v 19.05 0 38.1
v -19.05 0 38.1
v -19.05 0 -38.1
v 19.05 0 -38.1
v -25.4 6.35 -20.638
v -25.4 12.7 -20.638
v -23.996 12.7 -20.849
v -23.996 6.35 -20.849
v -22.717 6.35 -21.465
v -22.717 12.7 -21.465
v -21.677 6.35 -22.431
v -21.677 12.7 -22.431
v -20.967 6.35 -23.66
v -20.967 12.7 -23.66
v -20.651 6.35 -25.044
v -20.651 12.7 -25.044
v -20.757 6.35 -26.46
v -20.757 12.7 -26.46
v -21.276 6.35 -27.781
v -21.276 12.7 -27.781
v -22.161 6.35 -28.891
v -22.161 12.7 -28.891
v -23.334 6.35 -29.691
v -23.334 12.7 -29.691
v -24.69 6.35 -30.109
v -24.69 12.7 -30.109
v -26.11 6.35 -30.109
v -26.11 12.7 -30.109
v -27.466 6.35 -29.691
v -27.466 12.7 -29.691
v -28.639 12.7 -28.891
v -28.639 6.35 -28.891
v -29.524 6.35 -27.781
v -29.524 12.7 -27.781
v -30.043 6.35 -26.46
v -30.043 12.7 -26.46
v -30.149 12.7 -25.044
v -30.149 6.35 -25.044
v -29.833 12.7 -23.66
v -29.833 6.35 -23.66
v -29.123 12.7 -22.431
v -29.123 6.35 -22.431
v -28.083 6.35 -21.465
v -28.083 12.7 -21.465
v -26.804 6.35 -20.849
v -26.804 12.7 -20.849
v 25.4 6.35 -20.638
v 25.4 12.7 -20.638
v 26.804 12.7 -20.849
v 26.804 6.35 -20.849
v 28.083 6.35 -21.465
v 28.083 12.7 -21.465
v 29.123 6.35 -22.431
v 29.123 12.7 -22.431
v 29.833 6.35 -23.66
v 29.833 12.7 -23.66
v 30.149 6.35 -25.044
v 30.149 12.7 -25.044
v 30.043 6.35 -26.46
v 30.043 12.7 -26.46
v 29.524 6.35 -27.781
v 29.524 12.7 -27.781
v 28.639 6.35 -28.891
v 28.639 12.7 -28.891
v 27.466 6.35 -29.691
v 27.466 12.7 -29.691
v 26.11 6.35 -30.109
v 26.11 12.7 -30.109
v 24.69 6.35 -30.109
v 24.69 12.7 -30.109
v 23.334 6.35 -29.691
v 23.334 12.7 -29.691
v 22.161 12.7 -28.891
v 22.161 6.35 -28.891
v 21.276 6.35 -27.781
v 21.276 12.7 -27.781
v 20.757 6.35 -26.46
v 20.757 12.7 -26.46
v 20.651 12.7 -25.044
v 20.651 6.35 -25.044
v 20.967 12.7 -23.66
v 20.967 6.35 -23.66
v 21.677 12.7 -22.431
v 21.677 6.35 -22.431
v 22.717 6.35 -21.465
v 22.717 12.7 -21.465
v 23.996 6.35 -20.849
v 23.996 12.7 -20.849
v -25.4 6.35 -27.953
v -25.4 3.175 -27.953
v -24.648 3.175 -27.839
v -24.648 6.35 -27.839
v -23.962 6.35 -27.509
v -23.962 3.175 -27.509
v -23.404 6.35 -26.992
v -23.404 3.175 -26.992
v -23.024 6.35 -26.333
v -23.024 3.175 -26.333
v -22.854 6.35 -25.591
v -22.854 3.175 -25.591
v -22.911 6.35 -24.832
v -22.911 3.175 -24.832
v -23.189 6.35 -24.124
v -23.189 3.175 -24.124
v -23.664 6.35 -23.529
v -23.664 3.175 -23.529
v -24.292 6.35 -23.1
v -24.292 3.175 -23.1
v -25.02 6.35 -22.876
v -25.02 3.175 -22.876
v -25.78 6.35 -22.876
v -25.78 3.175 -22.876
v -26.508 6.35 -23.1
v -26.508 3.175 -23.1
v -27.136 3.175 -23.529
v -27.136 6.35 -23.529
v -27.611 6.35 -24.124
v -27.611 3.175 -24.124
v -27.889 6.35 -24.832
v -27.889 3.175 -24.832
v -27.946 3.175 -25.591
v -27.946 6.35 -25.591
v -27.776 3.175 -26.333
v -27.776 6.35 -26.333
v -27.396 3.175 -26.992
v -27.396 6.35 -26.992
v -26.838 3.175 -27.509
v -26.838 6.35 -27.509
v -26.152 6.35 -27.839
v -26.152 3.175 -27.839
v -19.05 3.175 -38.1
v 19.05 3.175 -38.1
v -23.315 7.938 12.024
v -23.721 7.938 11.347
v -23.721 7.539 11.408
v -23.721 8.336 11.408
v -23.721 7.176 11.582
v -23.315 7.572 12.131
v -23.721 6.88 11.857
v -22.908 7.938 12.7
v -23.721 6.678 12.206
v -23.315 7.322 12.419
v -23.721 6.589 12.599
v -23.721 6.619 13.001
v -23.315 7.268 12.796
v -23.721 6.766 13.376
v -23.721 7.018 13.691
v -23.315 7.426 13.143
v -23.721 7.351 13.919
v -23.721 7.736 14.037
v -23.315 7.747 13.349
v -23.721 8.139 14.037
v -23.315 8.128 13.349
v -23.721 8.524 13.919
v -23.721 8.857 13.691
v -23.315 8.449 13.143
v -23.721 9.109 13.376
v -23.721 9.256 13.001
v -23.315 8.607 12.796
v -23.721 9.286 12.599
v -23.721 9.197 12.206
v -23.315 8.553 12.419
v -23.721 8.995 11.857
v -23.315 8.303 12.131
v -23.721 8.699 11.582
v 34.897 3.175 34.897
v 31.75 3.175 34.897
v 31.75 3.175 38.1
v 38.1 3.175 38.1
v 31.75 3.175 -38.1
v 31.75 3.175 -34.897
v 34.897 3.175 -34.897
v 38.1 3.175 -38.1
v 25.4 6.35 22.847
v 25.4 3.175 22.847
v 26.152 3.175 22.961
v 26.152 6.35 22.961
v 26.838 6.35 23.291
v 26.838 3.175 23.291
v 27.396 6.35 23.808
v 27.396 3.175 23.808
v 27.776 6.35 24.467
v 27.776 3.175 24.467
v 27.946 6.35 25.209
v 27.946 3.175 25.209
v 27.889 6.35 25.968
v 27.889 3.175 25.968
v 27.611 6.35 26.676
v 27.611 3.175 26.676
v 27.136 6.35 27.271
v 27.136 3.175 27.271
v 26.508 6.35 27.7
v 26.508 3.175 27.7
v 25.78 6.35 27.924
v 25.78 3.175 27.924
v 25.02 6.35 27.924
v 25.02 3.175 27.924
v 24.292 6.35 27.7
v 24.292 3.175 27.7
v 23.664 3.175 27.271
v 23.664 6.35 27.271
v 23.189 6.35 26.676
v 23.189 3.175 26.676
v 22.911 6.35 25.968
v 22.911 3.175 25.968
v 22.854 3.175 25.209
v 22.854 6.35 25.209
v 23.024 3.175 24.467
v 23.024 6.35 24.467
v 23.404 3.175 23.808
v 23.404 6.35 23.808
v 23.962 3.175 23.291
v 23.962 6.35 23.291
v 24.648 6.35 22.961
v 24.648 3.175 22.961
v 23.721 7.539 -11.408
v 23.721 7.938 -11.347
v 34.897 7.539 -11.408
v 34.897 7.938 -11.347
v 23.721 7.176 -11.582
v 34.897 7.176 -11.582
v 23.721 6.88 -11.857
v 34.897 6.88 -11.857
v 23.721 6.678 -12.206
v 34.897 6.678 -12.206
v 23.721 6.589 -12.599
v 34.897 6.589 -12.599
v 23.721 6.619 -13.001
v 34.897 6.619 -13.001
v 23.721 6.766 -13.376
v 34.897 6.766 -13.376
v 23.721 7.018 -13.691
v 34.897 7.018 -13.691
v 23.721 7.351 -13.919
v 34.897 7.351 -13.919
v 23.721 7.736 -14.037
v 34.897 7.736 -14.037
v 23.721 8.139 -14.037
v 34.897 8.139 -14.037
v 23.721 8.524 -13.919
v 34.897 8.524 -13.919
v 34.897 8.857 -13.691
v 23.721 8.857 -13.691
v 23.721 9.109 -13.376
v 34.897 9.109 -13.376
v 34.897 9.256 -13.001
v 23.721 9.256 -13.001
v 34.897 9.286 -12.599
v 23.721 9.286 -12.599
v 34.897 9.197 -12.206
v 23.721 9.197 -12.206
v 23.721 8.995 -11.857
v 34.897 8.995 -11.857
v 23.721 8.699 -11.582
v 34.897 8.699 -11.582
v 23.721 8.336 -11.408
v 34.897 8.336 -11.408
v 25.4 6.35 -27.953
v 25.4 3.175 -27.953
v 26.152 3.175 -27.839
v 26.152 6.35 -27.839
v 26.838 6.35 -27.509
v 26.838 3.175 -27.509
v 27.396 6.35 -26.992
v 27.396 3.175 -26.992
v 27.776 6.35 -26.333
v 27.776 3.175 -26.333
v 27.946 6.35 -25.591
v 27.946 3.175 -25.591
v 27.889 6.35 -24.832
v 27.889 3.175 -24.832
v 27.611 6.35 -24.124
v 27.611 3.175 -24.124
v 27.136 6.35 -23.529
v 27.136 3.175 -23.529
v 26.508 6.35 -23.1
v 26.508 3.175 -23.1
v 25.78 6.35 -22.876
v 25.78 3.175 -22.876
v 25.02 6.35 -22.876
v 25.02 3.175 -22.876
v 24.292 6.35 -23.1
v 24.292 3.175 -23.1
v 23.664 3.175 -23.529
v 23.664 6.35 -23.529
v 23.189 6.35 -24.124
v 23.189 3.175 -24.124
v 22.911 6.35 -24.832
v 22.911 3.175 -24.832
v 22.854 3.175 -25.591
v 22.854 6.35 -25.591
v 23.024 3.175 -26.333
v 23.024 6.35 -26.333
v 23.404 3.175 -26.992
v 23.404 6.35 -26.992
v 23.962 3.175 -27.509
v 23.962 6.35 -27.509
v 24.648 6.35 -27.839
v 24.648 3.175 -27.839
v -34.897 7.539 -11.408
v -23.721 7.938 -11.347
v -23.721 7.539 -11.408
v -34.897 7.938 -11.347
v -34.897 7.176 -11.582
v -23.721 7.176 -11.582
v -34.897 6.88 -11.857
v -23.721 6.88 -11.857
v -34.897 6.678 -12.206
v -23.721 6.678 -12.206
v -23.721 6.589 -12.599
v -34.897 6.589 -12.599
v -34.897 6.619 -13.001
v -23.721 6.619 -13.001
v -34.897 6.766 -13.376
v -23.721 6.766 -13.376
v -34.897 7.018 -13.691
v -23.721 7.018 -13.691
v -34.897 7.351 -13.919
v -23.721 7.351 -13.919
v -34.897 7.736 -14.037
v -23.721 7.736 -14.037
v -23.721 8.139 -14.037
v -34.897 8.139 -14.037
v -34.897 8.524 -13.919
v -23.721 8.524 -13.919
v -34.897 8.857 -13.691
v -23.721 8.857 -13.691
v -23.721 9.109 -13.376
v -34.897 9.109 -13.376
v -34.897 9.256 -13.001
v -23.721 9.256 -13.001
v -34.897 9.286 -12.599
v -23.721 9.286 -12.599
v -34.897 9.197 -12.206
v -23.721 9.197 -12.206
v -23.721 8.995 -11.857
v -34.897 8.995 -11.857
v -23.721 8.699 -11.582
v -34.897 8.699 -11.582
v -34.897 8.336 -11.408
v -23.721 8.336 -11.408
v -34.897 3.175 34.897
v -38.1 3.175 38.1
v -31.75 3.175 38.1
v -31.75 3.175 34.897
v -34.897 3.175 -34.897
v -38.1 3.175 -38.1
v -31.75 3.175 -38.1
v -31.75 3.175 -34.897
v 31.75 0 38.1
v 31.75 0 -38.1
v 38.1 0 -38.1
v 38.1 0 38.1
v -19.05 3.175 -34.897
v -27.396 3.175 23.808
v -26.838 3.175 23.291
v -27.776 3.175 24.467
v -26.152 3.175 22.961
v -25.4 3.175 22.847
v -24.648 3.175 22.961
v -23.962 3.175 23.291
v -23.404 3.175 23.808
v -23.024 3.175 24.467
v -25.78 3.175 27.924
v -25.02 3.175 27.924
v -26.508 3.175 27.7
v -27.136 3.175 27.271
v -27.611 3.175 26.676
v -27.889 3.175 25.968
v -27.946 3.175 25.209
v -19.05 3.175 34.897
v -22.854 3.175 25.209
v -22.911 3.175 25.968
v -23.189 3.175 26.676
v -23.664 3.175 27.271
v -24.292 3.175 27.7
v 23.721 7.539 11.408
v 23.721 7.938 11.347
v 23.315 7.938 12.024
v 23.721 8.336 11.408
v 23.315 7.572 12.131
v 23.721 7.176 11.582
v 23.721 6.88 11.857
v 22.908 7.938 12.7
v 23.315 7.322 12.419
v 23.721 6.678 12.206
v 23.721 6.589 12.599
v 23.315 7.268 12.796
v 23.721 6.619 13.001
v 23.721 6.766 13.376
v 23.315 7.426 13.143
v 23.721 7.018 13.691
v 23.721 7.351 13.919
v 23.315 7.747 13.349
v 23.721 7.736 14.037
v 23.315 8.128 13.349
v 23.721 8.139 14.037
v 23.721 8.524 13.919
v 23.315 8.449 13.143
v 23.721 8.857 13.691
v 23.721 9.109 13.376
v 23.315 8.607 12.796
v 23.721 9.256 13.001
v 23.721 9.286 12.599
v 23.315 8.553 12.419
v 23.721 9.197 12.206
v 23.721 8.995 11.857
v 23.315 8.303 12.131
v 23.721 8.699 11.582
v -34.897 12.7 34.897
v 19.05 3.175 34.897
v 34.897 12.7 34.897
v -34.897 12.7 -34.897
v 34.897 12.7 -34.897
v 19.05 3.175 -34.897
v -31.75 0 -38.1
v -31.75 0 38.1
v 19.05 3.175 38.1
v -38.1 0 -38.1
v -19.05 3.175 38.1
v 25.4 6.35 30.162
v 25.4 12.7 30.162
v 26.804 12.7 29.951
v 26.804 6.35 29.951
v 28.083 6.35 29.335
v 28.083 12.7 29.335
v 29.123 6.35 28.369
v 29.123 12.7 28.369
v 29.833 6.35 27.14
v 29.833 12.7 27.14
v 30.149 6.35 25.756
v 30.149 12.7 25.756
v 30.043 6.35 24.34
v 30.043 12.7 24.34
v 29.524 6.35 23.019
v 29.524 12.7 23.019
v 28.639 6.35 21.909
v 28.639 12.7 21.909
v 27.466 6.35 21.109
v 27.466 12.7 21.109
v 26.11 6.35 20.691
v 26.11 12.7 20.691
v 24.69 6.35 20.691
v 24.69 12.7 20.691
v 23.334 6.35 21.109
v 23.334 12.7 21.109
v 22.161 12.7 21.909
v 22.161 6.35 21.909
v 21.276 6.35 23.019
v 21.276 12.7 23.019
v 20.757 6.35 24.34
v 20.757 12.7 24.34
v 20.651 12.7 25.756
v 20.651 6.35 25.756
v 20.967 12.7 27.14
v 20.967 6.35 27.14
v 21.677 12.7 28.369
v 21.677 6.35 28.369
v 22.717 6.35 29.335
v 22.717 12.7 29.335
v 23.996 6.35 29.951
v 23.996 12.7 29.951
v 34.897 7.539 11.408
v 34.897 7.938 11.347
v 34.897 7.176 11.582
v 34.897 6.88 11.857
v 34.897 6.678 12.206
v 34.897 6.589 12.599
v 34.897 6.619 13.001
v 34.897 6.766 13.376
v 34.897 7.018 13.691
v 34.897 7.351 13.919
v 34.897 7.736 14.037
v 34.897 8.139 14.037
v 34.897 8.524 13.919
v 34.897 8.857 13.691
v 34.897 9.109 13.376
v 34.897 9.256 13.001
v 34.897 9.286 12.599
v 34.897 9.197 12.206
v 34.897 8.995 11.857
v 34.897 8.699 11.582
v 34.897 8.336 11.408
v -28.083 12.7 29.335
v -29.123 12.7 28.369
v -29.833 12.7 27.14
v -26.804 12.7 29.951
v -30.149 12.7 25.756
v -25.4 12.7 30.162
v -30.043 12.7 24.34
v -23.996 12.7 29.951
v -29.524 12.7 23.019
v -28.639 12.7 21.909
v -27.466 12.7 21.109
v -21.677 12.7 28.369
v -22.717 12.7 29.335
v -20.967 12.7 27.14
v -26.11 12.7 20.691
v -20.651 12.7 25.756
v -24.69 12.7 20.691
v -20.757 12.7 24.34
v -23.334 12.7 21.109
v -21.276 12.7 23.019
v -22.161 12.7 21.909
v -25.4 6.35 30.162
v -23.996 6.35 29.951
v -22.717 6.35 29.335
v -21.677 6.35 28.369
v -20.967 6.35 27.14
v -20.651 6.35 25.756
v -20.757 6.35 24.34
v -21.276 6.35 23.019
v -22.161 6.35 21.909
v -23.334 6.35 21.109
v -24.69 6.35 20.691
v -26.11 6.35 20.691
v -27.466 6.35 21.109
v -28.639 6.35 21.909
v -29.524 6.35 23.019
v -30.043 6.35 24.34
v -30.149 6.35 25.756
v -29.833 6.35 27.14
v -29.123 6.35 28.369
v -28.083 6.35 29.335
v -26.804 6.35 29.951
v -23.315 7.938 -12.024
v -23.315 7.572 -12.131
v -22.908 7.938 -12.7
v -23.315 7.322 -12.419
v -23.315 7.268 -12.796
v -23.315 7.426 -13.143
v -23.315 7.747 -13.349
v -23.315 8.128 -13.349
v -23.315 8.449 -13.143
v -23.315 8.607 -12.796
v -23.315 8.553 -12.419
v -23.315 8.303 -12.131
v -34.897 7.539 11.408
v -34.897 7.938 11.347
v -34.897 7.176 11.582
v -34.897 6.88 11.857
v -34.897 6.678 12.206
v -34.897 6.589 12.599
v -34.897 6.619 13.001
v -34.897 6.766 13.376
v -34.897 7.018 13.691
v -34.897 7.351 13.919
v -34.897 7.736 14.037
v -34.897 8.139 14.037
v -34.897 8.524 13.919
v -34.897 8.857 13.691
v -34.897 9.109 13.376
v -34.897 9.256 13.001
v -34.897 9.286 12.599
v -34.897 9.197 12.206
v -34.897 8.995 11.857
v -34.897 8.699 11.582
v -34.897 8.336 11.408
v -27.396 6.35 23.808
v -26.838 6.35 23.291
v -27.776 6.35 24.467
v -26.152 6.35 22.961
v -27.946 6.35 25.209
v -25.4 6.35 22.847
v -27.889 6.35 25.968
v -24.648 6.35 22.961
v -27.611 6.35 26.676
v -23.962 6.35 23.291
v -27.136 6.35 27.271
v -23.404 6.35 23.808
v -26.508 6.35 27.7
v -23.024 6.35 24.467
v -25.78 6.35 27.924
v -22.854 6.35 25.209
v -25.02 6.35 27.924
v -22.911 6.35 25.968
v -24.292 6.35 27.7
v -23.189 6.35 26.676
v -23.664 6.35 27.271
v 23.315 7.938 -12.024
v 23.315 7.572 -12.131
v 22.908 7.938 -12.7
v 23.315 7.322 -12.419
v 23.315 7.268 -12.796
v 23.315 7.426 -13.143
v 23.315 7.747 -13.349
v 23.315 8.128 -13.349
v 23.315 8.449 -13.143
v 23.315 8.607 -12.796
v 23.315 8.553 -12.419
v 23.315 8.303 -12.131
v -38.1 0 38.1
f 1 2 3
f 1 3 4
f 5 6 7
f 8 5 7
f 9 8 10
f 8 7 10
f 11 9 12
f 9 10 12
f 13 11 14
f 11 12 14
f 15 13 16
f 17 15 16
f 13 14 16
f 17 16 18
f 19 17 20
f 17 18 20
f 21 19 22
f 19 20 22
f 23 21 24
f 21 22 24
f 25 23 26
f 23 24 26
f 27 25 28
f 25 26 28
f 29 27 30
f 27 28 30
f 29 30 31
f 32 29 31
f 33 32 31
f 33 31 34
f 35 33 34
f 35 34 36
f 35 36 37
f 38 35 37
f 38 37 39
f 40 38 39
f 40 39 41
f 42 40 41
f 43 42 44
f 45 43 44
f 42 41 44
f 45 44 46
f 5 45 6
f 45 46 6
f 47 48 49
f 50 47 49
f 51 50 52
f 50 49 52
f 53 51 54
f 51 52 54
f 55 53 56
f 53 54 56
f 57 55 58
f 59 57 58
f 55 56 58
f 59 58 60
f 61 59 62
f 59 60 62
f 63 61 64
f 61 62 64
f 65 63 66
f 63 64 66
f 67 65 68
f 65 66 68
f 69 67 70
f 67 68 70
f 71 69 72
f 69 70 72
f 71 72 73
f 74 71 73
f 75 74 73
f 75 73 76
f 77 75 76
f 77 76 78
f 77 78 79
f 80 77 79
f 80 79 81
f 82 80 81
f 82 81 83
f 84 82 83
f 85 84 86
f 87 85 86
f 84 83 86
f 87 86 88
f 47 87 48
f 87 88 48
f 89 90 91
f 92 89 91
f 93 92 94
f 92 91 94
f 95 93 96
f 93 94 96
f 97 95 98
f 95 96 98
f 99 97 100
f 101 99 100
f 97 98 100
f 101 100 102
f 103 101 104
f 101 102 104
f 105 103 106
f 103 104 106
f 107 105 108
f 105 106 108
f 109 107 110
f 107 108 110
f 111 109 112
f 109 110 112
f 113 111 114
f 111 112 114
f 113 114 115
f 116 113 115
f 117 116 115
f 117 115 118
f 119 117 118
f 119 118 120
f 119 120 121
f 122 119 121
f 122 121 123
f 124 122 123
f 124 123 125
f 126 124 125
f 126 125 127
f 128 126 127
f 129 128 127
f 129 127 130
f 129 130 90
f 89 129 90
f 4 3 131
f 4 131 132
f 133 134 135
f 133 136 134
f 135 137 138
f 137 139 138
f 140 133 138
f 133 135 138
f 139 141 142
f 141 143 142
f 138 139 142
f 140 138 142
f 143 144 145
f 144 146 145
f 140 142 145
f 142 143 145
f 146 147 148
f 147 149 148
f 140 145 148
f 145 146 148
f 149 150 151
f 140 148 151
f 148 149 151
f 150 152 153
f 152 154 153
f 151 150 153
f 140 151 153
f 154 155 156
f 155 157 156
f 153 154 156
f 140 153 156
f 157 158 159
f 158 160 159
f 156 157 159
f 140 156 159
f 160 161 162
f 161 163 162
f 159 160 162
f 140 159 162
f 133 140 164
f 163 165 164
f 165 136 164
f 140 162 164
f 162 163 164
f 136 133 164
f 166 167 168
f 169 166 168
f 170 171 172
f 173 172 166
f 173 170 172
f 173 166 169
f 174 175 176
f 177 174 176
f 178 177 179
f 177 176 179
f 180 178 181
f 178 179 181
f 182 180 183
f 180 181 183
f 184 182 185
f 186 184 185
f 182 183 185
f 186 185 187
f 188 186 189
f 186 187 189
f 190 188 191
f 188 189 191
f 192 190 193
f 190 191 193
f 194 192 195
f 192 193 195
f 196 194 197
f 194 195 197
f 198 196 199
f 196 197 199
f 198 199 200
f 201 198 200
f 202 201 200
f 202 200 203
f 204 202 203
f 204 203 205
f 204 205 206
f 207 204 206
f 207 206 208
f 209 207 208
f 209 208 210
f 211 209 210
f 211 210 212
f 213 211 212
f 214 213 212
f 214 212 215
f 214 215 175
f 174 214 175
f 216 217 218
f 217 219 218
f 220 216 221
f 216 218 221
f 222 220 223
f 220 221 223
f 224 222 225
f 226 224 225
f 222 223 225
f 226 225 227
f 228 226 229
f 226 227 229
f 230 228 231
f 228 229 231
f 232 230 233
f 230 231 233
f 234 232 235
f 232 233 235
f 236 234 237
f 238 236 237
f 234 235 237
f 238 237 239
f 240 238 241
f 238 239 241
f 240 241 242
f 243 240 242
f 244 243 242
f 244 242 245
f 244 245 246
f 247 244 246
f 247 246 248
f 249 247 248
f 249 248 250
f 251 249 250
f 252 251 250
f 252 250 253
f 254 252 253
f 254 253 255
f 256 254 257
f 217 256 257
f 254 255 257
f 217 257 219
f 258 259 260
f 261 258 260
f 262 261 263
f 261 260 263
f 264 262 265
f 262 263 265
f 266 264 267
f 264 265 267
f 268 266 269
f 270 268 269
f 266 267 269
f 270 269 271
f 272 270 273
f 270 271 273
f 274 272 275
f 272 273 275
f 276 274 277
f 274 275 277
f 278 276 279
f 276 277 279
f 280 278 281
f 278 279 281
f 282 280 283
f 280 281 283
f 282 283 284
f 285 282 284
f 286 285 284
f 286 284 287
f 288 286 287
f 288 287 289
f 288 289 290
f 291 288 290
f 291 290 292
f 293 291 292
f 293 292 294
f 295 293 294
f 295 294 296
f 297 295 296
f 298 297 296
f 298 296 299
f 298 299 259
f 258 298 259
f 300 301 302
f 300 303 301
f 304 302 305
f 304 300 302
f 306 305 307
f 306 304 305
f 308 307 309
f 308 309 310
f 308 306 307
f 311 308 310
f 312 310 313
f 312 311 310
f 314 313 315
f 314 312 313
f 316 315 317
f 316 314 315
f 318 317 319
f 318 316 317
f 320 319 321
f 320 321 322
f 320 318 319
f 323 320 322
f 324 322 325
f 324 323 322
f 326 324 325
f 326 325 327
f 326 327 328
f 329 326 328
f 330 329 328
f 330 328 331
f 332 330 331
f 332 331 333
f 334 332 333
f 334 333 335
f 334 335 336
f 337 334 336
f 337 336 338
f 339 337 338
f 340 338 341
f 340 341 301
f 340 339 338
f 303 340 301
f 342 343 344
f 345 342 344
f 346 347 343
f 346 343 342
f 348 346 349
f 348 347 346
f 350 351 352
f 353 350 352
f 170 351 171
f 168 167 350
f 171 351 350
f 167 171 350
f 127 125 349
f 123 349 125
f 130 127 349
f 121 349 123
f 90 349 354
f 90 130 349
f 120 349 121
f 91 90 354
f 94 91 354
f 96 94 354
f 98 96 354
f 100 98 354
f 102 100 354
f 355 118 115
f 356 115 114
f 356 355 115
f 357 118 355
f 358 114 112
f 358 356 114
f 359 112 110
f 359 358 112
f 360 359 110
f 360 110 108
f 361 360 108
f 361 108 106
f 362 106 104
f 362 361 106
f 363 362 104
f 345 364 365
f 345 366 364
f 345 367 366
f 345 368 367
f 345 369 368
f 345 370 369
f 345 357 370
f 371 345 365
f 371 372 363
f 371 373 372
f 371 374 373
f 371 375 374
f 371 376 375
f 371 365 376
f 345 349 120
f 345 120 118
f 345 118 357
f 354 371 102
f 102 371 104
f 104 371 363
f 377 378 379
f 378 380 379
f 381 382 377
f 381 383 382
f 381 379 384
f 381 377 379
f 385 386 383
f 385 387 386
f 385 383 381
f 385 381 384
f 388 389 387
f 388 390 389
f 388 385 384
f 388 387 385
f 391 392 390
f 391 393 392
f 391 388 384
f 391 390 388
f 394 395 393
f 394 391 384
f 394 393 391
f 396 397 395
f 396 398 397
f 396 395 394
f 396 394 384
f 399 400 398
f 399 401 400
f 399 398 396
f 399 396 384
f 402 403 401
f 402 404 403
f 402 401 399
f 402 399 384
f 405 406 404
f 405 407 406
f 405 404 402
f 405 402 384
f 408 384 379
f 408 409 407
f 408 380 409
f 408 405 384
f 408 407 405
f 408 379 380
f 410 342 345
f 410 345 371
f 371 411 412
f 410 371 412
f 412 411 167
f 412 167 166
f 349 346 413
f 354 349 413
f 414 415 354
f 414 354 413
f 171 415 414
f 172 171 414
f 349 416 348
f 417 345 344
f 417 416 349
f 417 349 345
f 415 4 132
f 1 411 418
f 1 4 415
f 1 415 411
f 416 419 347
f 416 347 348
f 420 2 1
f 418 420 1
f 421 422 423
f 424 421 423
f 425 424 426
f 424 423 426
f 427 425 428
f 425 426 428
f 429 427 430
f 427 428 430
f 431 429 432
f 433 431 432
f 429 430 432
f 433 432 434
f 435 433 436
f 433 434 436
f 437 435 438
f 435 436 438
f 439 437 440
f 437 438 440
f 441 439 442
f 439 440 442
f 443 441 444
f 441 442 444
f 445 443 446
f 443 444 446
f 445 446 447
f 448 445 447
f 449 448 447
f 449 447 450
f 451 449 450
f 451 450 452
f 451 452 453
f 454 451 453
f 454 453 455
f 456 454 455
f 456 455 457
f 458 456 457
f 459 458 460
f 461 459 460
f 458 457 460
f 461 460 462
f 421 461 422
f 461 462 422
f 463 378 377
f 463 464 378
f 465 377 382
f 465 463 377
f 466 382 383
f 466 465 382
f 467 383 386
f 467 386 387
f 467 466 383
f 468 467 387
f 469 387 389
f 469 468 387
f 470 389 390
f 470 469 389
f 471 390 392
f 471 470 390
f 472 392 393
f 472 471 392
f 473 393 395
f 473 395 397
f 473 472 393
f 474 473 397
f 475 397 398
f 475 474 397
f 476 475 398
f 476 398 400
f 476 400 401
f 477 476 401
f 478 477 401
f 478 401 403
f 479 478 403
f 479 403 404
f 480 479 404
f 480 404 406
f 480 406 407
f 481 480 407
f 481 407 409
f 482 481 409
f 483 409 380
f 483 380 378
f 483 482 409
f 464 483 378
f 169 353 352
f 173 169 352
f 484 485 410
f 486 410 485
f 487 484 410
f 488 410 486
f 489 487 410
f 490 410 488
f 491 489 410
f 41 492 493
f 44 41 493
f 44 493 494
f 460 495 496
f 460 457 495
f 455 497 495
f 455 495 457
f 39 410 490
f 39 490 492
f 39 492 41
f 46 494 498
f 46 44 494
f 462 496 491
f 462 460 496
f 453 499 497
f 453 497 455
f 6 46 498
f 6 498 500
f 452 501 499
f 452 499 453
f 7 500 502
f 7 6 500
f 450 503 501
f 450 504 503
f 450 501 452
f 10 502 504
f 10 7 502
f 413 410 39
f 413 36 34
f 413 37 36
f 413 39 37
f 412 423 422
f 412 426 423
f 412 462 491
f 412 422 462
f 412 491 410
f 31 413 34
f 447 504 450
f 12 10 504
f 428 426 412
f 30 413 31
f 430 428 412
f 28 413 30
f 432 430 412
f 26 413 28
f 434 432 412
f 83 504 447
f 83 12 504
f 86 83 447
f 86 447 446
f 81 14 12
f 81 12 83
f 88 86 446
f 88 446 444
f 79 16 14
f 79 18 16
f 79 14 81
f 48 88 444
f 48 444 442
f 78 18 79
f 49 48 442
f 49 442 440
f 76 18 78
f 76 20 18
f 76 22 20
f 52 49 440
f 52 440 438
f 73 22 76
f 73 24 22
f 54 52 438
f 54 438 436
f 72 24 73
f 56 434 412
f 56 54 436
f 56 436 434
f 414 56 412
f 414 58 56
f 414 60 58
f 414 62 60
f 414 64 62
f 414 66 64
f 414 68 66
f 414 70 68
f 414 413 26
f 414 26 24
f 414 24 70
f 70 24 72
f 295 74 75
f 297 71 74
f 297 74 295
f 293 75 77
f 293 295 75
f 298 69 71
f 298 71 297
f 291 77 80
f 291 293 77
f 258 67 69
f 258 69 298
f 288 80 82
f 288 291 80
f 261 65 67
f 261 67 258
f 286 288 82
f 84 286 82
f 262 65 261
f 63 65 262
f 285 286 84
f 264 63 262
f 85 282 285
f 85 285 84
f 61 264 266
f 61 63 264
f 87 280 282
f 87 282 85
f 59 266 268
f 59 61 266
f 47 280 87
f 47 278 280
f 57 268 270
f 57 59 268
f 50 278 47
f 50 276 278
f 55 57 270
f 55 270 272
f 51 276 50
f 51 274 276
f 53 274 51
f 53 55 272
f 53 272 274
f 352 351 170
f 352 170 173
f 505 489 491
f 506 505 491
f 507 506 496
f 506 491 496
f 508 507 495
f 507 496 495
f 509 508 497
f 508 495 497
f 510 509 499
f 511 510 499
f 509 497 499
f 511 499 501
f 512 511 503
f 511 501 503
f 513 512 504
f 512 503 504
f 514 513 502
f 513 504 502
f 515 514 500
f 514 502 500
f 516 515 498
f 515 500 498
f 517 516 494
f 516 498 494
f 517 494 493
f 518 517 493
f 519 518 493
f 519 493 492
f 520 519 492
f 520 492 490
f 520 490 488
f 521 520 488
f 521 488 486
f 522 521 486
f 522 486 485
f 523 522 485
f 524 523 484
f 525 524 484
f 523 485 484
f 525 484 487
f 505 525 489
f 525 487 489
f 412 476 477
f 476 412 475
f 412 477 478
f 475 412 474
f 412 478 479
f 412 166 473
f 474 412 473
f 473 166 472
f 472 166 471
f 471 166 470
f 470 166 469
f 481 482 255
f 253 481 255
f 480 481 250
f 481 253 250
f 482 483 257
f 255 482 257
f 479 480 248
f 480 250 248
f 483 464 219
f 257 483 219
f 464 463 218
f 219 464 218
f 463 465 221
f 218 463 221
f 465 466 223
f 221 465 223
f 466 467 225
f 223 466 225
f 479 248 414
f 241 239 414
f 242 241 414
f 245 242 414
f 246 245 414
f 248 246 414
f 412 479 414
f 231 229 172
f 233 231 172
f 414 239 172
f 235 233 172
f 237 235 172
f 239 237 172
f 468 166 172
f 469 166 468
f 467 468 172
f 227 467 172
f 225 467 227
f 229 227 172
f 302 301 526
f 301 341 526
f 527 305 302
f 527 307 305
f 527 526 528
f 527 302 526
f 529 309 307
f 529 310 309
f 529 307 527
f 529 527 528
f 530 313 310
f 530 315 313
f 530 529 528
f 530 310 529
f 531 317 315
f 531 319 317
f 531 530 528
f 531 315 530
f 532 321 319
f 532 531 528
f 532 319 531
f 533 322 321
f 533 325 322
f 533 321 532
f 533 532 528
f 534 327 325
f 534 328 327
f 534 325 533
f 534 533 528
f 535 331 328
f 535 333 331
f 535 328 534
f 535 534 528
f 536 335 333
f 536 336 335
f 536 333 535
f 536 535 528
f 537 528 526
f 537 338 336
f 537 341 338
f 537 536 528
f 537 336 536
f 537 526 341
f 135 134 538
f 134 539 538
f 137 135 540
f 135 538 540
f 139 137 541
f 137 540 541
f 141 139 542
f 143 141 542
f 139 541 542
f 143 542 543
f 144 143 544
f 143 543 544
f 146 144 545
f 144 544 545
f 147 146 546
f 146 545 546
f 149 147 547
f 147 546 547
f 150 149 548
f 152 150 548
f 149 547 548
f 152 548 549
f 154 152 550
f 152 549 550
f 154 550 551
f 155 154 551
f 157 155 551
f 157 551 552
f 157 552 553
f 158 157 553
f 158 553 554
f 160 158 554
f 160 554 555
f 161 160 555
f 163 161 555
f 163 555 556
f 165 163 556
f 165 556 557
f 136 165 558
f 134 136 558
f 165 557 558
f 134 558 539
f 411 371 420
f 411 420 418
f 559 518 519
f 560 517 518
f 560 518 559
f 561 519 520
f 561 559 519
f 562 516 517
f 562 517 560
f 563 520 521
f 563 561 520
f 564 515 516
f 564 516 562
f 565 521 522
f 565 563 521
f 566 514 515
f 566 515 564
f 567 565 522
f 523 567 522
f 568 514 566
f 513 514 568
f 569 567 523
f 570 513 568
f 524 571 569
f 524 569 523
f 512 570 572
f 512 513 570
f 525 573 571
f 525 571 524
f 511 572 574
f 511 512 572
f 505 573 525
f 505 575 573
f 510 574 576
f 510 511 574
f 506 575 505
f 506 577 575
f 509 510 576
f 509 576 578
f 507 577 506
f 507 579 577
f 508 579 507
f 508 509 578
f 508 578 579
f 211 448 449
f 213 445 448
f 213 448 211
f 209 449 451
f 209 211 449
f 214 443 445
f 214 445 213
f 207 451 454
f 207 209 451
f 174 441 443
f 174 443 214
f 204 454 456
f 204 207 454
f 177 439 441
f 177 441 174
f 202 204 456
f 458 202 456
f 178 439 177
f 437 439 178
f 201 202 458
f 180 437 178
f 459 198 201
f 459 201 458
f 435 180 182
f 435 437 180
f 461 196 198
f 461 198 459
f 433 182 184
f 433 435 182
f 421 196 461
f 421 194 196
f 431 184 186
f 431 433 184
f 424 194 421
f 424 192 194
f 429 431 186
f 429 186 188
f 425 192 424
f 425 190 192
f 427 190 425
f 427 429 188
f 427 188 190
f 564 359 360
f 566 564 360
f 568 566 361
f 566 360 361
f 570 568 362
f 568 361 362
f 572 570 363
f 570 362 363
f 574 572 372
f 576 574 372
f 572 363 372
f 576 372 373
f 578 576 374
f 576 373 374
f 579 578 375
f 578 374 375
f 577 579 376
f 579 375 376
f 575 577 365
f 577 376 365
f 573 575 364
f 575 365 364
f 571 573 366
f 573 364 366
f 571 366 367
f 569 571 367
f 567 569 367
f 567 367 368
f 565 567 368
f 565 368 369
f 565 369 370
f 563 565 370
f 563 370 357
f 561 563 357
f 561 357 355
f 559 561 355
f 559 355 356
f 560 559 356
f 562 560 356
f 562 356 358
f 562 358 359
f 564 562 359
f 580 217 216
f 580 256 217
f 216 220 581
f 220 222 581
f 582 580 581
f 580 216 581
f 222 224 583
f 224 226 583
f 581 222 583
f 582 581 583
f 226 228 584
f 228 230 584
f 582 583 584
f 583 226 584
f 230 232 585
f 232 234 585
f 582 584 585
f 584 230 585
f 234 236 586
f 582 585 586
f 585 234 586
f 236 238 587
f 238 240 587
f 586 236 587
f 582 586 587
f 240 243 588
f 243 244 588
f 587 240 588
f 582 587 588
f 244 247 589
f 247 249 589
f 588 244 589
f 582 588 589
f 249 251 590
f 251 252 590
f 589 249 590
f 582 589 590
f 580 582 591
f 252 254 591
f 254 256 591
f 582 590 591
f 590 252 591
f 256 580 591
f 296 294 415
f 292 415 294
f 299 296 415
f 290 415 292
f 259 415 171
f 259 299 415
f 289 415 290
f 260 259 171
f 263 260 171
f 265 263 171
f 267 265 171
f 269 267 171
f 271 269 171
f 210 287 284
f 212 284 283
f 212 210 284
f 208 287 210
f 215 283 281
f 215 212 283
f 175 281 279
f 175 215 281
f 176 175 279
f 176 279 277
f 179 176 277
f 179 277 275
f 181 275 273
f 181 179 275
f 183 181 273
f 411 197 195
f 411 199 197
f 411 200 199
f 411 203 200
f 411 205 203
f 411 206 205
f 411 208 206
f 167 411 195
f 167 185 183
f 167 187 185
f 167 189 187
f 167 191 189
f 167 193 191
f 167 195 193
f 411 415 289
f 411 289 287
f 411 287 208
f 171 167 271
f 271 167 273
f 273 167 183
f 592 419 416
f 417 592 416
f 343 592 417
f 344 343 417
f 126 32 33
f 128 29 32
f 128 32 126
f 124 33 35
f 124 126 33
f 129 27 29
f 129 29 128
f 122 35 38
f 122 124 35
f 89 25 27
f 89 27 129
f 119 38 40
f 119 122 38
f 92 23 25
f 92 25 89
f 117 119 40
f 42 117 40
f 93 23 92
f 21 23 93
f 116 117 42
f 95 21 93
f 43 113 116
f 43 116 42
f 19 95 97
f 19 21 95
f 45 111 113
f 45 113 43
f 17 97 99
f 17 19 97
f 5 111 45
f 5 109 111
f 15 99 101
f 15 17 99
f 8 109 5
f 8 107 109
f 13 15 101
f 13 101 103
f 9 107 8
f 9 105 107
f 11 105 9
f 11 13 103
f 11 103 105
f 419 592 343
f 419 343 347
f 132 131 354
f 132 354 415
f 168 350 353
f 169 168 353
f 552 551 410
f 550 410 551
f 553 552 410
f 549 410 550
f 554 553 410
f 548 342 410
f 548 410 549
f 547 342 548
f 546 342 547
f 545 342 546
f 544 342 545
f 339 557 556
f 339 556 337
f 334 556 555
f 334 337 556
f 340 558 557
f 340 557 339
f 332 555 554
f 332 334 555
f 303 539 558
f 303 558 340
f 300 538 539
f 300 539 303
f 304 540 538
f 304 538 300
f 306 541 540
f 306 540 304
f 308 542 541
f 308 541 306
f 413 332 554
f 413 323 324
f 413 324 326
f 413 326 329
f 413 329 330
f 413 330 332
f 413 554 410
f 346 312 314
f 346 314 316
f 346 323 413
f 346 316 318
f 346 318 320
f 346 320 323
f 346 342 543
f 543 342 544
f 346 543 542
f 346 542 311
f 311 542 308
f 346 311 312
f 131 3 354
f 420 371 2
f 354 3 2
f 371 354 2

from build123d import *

# Parameters (mm, degrees)
SKETCH1_W           = 76.2
SKETCH1_H           = 76.2
BOSS_EXTRUDE1_DEPTH = 3.175
SKETCH2_W           = 69.79412
SKETCH2_H           = 69.79412
SKETCH2_W_2         = 57.09412
SKETCH2_H_2         = 57.09412
BOSS_EXTRUDE2_DEPTH = 9.525
SKETCH13_W          = 12.7
SKETCH13_H          = 76.2
CUT_EXTRUDE1_DEPTH  = 3.175
SKETCH15_R          = 2.5527
CUT_EXTRUDE2_DEPTH  = 55.716959208
SKETCH17_R          = 4.7625
CUT_EXTRUDE3_DEPTH  = 6.35


with BuildPart() as part:
    # Sketch1 → Boss-Extrude1 (new body)
    with BuildSketch(Plane(origin=(0, 0, 0), x_dir=(1, 0, 0), z_dir=(0, 1, 0))):
        Rectangle(SKETCH1_W, SKETCH1_H)
    extrude(amount=BOSS_EXTRUDE1_DEPTH)

    # Sketch2 → Boss-Extrude2 (add)
    # profile 1 of 2: a face of its own
    with BuildSketch(Plane(origin=(0, 3.175, 0), x_dir=(1, 0, 0), z_dir=(0, 1, 0))):
        Rectangle(SKETCH2_W, SKETCH2_H)
        Rectangle(SKETCH2_W_2, SKETCH2_H_2, mode=Mode.SUBTRACT)
    # profile 2 of 2: a face of its own
    with BuildSketch(Plane(origin=(0, 3.175, 0), x_dir=(1, 0, 0), z_dir=(0, 1, 0))):
        Rectangle(SKETCH2_W_2, SKETCH2_H_2)
    extrude(amount=BOSS_EXTRUDE2_DEPTH)

    # Sketch9 → #6-32 Tapped Hole2 (revolve, cut)
    with BuildSketch(Plane(origin=(34.89706, 7.9375, 12.7), x_dir=(0, 0, -1), z_dir=(0, 1, 0))):
        Polygon((0, 0), (0, 11.98869403), (1.35255, 11.176), (1.35255, 0), align=None)
    f_6_32_tapped_hole2 = revolve(axis=Axis((41.24706, 7.9375, 12.7), (-1, 0, 0)), mode=Mode.SUBTRACT)

    # Mirror1: #6-32 Tapped Hole2 across plane
    add(f_6_32_tapped_hole2.mirror(Plane.XY), mode=Mode.SUBTRACT)

    # Mirror2: #6-32 Tapped Hole2 across plane
    add(f_6_32_tapped_hole2.mirror(Plane(origin=(0, 0, 0), x_dir=(0, 0, 1), z_dir=(1, 0, 0))), mode=Mode.SUBTRACT)

    # Mirror2 copy 1 sketch → Mirror2 copy 1 (revolve, cut)
    with BuildSketch(Plane(origin=(-34.89706, 7.9375, -12.7), x_dir=(0, 0, 1), z_dir=(0, 1, 0))):
        Polygon((0, 0), (0, 11.98869403), (1.35255, 11.176), (1.35255, 0), align=None)
    revolve(axis=Axis((-41.24706, 7.9375, -12.7), (1, 0, 0)), mode=Mode.SUBTRACT)

    # Sketch13 → Cut-Extrude1 (cut)
    with BuildSketch(Plane.XZ):
        with Locations((-25.4, 0)):
            Rectangle(SKETCH13_W, SKETCH13_H)
        with Locations((25.4, 0)):
            Rectangle(SKETCH13_W, SKETCH13_H)
    extrude(amount=-CUT_EXTRUDE1_DEPTH, mode=Mode.SUBTRACT)

    # Sketch15 → Cut-Extrude2 (cut, through all)
    with BuildSketch(Plane.XZ.offset(-3.175)):
        with Locations(Location((-25.4, 25.4, 0), (0, 0, 270))):
            Circle(SKETCH15_R)
        with Locations(Location((25.4, 25.4, 0), (0, 0, 270))):
            Circle(SKETCH15_R)
        with Locations(Location((25.4, -25.4, 0), (0, 0, 270))):
            Circle(SKETCH15_R)
        with Locations(Location((-25.4, -25.4, 0), (0, 0, 270))):
            Circle(SKETCH15_R)
    extrude(amount=-CUT_EXTRUDE2_DEPTH, mode=Mode.SUBTRACT)

    # Sketch17 → Cut-Extrude3 (cut)
    with BuildSketch(Plane(origin=(0, 12.7, 0), x_dir=(1, 0, 0), z_dir=(0, 1, 0))):
        with Locations(Location((-25.4, 25.4, 0), (0, 0, 270))):
            Circle(SKETCH17_R)
        with Locations(Location((25.4, 25.4, 0), (0, 0, 270))):
            Circle(SKETCH17_R)
        with Locations(Location((25.4, -25.4, 0), (0, 0, 270))):
            Circle(SKETCH17_R)
        with Locations(Location((-25.4, -25.4, 0), (0, 0, 270))):
            Circle(SKETCH17_R)
    extrude(amount=-CUT_EXTRUDE3_DEPTH, mode=Mode.SUBTRACT)


solid = part.part
